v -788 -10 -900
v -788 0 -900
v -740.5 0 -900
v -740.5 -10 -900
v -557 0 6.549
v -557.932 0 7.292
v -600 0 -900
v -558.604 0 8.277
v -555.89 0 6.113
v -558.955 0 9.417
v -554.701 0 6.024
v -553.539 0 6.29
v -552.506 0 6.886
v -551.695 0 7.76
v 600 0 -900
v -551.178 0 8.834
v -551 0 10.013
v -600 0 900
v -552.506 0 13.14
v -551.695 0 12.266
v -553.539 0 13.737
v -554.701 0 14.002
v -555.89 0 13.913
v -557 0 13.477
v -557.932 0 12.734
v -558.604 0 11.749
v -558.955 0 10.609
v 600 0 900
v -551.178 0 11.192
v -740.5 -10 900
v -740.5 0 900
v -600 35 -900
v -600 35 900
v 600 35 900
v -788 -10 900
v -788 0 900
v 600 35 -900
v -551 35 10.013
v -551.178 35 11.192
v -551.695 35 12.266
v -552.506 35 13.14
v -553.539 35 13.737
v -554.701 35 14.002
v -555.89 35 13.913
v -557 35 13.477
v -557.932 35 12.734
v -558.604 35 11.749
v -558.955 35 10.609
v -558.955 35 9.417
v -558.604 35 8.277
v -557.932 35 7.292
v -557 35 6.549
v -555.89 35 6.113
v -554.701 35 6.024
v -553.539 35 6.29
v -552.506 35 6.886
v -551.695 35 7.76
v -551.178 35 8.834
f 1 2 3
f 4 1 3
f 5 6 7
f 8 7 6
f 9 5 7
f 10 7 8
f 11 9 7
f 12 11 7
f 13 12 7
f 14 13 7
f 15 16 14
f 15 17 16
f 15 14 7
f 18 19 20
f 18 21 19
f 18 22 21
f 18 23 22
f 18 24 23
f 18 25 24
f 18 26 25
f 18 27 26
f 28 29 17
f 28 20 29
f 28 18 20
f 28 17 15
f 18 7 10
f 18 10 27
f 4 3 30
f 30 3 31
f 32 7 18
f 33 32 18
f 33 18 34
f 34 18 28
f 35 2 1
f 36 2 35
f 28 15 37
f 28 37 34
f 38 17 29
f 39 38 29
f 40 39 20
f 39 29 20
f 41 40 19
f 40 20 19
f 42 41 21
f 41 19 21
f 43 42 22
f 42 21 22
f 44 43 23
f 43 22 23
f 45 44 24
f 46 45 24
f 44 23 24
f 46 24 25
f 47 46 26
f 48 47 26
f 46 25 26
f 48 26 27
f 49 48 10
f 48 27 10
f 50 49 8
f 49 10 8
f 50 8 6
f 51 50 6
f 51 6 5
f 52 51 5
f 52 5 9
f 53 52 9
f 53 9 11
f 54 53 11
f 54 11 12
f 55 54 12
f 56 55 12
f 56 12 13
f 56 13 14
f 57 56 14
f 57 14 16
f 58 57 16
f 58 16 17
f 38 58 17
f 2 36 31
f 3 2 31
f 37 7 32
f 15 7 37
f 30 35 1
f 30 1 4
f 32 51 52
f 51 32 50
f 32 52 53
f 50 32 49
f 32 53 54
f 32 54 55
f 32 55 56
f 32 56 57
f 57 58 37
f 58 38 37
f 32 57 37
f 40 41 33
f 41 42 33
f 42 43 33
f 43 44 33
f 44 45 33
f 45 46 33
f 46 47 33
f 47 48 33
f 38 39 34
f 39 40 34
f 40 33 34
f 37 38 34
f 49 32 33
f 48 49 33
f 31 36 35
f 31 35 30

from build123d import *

# Parameters (mm, degrees)
F0_W     = 1200
F0_H     = 1800
F1_DEPTH = 35
F2_R     = 4
F3_DEPTH = 35.001
F4_W     = 47.5
F4_H     = 1800
F5_DEPTH = 10


with BuildPart() as f1:
    # F0 (on Front) → F1 (new body)
    with BuildSketch(Plane.XZ):
        Rectangle(F0_W, F0_H)
    extrude(amount=-F1_DEPTH)

    # F2 (on face) → F3 (cut, through all)
    with BuildSketch(Plane.XZ):
        with Locations((-555, 10.01303)):
            Circle(F2_R)
    extrude(amount=-F3_DEPTH, mode=Mode.SUBTRACT)


with BuildPart() as f5:
    # F4 (on Front) → F5 (new body)
    with BuildSketch(Plane.XZ):
        with Locations((-764.250457, 0)):
            Rectangle(F4_W, F4_H)
    extrude(amount=F5_DEPTH)


solid = Compound([f1.part, f5.part])
